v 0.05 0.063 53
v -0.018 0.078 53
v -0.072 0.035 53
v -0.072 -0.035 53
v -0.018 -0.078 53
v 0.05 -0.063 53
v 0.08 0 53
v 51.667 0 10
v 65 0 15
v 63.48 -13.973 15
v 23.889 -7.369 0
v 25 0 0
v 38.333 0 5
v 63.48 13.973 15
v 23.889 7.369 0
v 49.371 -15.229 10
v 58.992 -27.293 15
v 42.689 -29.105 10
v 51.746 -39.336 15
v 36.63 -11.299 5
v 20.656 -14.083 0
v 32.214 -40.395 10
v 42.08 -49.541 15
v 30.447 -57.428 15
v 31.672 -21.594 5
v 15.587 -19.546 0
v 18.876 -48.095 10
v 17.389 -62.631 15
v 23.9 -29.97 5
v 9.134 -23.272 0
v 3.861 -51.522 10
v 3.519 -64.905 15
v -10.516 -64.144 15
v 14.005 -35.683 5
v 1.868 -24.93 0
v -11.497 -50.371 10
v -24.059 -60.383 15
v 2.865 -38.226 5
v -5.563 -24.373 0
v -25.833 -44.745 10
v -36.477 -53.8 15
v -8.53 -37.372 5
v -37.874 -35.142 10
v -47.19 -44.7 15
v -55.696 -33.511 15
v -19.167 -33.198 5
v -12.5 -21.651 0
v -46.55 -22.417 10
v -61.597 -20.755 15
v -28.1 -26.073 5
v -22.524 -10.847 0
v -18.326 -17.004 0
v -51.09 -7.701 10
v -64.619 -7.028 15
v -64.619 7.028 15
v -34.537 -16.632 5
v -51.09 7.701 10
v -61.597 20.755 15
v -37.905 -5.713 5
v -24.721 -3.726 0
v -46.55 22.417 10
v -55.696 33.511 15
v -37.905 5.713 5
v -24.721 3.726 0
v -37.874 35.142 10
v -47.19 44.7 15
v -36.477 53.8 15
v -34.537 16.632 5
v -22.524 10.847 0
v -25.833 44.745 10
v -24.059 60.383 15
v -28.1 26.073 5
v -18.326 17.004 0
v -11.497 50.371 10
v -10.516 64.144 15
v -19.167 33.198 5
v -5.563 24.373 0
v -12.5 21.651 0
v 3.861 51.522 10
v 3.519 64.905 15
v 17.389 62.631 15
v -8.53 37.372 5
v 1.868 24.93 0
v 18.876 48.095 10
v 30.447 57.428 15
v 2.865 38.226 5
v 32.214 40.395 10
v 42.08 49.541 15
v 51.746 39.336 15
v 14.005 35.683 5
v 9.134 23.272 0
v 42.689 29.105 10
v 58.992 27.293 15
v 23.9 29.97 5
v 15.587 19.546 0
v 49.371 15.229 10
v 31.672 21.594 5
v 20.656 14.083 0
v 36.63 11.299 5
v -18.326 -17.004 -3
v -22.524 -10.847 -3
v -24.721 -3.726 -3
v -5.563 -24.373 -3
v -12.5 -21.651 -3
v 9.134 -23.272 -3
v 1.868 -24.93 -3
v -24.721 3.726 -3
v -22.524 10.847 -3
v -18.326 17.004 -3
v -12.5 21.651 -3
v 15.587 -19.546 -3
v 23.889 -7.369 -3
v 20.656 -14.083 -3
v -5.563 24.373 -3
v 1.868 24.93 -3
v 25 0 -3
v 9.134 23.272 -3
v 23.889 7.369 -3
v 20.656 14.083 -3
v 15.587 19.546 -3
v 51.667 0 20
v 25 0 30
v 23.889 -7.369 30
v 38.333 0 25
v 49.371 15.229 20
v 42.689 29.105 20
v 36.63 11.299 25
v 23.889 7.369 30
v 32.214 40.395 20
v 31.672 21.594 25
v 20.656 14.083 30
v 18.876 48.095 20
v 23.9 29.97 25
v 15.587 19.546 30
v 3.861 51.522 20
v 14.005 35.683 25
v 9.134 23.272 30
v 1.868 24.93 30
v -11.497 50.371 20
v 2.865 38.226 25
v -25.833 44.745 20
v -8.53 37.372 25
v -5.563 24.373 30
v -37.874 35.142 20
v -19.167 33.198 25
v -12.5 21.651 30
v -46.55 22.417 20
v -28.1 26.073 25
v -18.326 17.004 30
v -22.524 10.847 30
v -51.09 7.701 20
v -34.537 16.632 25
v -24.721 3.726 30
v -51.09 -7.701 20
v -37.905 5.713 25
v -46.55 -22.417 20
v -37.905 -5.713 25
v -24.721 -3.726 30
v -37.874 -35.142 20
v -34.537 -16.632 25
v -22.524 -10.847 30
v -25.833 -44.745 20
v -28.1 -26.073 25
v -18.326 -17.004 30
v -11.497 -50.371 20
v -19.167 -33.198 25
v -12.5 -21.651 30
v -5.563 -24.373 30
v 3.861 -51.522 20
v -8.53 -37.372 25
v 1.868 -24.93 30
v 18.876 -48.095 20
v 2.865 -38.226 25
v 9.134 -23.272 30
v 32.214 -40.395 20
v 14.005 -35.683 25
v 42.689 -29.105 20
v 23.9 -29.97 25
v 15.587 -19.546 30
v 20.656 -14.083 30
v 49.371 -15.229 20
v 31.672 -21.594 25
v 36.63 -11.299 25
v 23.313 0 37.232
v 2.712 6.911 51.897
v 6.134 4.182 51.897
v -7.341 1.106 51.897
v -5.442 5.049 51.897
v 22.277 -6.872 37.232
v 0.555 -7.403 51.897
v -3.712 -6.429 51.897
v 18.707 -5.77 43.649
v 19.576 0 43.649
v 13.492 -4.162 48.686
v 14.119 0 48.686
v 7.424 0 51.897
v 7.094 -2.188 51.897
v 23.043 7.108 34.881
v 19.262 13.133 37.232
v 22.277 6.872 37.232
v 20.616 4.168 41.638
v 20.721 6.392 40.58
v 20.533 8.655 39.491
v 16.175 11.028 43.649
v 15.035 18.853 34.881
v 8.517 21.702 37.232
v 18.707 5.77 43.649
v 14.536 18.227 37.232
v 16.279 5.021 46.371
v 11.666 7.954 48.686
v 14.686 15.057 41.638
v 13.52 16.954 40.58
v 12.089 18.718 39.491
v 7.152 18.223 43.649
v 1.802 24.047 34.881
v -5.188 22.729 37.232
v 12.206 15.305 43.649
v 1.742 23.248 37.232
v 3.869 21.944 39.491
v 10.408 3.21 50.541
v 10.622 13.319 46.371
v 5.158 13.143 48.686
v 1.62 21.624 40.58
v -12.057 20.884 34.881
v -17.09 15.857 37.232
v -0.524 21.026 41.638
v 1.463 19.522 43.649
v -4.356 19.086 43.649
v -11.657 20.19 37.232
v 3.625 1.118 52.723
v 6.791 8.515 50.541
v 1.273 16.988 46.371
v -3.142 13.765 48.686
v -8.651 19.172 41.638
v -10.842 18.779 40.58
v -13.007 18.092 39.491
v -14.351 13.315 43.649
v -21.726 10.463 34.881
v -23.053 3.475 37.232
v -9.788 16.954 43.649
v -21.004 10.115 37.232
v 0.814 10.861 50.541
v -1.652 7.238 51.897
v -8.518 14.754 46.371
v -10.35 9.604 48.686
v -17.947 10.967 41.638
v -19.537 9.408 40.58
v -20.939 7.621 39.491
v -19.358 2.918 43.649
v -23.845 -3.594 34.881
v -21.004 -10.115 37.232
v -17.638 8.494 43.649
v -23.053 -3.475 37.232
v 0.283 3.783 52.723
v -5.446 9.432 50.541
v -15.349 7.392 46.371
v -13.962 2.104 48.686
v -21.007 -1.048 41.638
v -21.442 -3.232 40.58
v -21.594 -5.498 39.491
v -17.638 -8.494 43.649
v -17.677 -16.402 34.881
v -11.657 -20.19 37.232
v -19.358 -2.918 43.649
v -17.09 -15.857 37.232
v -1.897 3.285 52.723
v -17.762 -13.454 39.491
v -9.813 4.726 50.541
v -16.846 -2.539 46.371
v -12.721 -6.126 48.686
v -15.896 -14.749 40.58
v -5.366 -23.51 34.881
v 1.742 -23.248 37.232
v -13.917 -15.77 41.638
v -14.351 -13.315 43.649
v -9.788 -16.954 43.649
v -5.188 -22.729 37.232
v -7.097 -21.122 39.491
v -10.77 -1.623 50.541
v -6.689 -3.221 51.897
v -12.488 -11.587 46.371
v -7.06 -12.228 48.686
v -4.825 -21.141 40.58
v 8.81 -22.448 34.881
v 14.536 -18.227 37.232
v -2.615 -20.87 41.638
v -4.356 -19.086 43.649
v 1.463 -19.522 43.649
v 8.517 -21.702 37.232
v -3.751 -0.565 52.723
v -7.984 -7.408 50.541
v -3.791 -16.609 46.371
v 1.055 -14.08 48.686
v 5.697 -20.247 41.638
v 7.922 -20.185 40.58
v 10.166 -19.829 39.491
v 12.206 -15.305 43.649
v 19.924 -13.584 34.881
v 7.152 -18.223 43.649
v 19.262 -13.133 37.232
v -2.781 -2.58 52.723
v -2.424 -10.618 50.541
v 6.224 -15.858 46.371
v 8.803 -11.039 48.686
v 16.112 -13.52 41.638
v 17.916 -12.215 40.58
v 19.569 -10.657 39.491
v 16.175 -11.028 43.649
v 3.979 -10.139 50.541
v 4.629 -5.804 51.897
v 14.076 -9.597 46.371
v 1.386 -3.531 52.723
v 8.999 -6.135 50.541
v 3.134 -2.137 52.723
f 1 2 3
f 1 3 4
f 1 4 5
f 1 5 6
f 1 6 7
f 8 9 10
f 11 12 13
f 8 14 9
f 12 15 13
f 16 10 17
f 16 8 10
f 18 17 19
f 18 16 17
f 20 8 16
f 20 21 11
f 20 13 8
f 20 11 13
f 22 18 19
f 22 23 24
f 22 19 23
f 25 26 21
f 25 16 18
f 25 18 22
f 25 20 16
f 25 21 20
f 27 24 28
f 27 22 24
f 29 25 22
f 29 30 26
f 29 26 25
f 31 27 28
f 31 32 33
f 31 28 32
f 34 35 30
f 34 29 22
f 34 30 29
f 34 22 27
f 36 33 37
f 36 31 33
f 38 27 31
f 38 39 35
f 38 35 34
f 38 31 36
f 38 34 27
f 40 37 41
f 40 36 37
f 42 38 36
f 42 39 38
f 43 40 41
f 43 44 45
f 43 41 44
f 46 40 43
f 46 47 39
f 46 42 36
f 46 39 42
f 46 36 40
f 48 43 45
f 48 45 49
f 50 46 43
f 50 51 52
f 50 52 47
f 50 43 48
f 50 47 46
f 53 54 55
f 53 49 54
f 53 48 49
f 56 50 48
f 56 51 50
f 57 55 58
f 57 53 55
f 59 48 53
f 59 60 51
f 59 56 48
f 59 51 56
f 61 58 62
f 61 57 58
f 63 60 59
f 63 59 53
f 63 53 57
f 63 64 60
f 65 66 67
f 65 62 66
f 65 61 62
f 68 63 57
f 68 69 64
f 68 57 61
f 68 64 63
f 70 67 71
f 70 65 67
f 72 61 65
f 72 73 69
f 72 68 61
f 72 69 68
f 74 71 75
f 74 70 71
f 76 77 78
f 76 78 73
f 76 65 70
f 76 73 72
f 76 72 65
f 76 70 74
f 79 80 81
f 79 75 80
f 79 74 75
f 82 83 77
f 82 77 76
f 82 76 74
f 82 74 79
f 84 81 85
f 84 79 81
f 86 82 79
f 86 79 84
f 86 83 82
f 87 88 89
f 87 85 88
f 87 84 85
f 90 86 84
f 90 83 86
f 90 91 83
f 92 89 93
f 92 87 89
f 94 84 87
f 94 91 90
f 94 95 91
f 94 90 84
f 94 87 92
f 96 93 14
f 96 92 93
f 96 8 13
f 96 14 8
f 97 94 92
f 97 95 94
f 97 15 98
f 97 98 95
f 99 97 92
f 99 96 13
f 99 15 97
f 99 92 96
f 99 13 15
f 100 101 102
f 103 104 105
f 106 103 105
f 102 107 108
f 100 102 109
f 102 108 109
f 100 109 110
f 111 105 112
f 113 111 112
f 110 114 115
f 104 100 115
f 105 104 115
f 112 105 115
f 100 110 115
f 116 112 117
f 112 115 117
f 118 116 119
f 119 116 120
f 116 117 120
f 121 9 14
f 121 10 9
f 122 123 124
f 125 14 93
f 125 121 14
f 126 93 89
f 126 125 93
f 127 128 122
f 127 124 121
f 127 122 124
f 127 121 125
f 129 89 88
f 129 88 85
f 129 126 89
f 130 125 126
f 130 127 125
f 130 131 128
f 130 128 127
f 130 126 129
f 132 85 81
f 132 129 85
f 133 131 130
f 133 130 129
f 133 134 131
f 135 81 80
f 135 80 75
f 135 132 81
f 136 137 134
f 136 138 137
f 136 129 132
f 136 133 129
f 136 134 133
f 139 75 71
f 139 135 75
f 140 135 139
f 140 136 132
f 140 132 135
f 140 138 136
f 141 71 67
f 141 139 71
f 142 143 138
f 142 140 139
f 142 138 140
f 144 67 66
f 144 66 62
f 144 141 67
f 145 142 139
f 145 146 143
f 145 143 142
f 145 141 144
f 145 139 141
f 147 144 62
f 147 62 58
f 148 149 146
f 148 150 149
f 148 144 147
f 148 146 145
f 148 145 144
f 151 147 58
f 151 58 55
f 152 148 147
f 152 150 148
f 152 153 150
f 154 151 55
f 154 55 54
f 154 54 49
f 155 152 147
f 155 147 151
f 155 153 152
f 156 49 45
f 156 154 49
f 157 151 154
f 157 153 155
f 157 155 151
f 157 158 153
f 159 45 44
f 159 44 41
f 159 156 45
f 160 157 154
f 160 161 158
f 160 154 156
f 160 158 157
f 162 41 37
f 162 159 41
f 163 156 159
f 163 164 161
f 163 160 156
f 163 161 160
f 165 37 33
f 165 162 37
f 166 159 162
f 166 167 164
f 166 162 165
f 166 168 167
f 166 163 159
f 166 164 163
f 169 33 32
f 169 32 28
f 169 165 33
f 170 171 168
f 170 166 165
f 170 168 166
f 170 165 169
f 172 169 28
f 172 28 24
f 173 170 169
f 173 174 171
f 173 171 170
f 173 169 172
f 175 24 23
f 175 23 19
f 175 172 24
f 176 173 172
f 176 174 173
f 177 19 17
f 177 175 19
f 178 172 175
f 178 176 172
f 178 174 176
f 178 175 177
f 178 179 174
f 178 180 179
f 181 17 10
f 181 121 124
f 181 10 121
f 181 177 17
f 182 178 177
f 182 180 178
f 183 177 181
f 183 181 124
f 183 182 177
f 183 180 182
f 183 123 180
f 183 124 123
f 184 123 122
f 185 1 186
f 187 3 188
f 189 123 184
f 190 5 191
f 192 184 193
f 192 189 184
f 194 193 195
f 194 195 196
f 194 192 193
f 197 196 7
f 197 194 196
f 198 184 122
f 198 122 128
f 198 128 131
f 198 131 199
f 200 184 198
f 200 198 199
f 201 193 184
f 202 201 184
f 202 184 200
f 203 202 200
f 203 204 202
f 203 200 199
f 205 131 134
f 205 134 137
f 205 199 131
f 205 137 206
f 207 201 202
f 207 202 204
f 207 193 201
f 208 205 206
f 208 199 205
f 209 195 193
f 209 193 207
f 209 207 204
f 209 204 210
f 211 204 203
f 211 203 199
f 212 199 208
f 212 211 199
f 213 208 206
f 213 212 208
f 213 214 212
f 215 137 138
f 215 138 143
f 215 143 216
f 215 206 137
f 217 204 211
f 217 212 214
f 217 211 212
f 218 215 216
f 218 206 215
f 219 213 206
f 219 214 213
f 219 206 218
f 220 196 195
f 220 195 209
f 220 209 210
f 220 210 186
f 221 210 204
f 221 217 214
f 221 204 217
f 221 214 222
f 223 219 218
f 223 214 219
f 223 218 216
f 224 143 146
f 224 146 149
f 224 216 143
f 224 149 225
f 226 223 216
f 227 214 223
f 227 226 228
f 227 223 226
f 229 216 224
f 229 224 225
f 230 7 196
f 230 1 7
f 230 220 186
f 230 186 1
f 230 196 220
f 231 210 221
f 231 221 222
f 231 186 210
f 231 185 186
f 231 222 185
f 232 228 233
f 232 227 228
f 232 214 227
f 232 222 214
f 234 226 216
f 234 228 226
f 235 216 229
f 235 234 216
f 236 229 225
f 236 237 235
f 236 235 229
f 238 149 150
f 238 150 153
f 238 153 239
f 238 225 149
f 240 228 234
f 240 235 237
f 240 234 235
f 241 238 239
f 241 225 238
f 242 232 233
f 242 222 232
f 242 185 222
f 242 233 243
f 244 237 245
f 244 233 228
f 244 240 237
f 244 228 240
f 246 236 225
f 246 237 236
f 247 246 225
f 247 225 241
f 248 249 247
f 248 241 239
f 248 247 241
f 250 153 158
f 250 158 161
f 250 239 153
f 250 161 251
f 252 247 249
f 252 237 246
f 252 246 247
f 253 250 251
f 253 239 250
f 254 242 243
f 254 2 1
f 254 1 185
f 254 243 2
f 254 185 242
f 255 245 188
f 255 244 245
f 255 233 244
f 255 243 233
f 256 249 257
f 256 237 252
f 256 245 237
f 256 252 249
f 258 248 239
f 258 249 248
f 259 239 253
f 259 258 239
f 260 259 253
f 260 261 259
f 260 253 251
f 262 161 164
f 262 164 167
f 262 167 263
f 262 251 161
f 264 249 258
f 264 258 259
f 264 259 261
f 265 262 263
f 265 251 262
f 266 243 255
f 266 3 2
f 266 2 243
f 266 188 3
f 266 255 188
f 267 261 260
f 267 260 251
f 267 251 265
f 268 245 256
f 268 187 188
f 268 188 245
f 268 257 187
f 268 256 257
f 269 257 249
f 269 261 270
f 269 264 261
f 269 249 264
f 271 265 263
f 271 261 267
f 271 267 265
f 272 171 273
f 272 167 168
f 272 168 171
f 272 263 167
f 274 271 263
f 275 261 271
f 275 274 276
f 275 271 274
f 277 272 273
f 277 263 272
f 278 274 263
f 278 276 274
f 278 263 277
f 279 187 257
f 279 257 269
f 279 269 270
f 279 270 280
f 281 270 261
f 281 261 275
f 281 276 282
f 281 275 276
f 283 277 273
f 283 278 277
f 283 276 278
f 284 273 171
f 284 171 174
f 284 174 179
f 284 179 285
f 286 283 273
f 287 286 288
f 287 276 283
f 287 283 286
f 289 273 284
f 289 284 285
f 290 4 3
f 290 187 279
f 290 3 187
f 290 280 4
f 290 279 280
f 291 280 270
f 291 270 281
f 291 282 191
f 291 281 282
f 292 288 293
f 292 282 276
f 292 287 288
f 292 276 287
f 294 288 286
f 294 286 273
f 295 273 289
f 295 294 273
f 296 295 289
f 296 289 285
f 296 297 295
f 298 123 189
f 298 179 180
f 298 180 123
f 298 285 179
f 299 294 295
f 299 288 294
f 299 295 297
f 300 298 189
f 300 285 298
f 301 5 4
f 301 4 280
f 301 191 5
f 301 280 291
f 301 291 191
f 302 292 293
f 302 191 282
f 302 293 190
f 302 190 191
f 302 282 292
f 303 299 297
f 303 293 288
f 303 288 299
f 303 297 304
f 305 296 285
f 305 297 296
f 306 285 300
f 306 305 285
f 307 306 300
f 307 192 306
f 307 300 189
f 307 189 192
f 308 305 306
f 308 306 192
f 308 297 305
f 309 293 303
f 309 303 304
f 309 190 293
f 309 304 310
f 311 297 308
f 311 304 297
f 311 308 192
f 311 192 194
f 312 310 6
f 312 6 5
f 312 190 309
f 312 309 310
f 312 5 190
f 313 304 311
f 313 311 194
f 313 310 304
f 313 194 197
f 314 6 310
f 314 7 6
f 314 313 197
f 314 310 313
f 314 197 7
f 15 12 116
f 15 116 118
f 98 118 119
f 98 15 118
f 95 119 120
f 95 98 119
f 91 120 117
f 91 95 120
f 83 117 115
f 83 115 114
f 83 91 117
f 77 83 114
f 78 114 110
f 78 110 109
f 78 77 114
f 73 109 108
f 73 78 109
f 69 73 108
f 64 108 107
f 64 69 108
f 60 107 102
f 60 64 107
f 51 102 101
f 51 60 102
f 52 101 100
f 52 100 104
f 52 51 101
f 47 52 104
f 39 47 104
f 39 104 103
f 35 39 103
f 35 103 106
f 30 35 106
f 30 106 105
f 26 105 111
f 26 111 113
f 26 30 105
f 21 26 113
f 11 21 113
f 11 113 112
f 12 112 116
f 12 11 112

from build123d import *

# Parameters (mm, degrees)
F2_R      = 65
F3_R      = 25
F5_FACE_R = 65
F4_R      = 25
F7_DEPTH  = 23
F9_DEPTH  = 3


# Not quite as in the source:
# - a fillet or chamfer that OpenCascade refuses, or shapes differently, is made with other operations: its cross-section is extruded or revolved along the edge and cut away or added


with BuildPart() as f5:
    # F2 (on offset) → F5 section 0
    with BuildSketch(Plane.XY.offset(15)):
        Circle(F2_R)
    # F3 (on offset) → F5 section 1
    with BuildSketch(Plane.XY.offset(30)):
        Circle(F3_R)
    loft()

    # F5_face (on face) → F6 section 0
    with BuildSketch(Plane(origin=(0, 0, 15), x_dir=(1, 0, 0), z_dir=(0, 0, -1))):
        Circle(F5_FACE_R)
    # F4 (on Top) → F6 section 1
    with BuildSketch(Plane.XY):
        Circle(F4_R)
    loft()

    # F7 (add): a face of the model
    f7_faces = [f5.faces().sort_by_distance(p)[0] for p in [
        (0, 0, 30),
    ]]
    extrude(f7_faces, amount=F7_DEPTH)

    # F8: fillet of radius 25 on 1 edges, made by hand

    # F8_s1 → F8_t2 (revolve, cut)
    with BuildSketch(Plane.XZ):
        with BuildLine():
            ThreePointArc((25, 30), (17.0359533691, 46.3711730709), (0.0801284112, 53))
            Line((0.0801284112, 53), (25, 53))
            Line((25, 53), (25, 30))
        make_face()
    revolve(axis=Axis((0, 0, 53), (0, 0, 1)), mode=Mode.SUBTRACT)

    # F9 (add): a face of the model
    f9_faces = [f5.faces().sort_by_distance(p)[0] for p in [
        (0, 0, 0),
    ]]
    extrude(f9_faces, amount=F9_DEPTH)


solid = f5.part
